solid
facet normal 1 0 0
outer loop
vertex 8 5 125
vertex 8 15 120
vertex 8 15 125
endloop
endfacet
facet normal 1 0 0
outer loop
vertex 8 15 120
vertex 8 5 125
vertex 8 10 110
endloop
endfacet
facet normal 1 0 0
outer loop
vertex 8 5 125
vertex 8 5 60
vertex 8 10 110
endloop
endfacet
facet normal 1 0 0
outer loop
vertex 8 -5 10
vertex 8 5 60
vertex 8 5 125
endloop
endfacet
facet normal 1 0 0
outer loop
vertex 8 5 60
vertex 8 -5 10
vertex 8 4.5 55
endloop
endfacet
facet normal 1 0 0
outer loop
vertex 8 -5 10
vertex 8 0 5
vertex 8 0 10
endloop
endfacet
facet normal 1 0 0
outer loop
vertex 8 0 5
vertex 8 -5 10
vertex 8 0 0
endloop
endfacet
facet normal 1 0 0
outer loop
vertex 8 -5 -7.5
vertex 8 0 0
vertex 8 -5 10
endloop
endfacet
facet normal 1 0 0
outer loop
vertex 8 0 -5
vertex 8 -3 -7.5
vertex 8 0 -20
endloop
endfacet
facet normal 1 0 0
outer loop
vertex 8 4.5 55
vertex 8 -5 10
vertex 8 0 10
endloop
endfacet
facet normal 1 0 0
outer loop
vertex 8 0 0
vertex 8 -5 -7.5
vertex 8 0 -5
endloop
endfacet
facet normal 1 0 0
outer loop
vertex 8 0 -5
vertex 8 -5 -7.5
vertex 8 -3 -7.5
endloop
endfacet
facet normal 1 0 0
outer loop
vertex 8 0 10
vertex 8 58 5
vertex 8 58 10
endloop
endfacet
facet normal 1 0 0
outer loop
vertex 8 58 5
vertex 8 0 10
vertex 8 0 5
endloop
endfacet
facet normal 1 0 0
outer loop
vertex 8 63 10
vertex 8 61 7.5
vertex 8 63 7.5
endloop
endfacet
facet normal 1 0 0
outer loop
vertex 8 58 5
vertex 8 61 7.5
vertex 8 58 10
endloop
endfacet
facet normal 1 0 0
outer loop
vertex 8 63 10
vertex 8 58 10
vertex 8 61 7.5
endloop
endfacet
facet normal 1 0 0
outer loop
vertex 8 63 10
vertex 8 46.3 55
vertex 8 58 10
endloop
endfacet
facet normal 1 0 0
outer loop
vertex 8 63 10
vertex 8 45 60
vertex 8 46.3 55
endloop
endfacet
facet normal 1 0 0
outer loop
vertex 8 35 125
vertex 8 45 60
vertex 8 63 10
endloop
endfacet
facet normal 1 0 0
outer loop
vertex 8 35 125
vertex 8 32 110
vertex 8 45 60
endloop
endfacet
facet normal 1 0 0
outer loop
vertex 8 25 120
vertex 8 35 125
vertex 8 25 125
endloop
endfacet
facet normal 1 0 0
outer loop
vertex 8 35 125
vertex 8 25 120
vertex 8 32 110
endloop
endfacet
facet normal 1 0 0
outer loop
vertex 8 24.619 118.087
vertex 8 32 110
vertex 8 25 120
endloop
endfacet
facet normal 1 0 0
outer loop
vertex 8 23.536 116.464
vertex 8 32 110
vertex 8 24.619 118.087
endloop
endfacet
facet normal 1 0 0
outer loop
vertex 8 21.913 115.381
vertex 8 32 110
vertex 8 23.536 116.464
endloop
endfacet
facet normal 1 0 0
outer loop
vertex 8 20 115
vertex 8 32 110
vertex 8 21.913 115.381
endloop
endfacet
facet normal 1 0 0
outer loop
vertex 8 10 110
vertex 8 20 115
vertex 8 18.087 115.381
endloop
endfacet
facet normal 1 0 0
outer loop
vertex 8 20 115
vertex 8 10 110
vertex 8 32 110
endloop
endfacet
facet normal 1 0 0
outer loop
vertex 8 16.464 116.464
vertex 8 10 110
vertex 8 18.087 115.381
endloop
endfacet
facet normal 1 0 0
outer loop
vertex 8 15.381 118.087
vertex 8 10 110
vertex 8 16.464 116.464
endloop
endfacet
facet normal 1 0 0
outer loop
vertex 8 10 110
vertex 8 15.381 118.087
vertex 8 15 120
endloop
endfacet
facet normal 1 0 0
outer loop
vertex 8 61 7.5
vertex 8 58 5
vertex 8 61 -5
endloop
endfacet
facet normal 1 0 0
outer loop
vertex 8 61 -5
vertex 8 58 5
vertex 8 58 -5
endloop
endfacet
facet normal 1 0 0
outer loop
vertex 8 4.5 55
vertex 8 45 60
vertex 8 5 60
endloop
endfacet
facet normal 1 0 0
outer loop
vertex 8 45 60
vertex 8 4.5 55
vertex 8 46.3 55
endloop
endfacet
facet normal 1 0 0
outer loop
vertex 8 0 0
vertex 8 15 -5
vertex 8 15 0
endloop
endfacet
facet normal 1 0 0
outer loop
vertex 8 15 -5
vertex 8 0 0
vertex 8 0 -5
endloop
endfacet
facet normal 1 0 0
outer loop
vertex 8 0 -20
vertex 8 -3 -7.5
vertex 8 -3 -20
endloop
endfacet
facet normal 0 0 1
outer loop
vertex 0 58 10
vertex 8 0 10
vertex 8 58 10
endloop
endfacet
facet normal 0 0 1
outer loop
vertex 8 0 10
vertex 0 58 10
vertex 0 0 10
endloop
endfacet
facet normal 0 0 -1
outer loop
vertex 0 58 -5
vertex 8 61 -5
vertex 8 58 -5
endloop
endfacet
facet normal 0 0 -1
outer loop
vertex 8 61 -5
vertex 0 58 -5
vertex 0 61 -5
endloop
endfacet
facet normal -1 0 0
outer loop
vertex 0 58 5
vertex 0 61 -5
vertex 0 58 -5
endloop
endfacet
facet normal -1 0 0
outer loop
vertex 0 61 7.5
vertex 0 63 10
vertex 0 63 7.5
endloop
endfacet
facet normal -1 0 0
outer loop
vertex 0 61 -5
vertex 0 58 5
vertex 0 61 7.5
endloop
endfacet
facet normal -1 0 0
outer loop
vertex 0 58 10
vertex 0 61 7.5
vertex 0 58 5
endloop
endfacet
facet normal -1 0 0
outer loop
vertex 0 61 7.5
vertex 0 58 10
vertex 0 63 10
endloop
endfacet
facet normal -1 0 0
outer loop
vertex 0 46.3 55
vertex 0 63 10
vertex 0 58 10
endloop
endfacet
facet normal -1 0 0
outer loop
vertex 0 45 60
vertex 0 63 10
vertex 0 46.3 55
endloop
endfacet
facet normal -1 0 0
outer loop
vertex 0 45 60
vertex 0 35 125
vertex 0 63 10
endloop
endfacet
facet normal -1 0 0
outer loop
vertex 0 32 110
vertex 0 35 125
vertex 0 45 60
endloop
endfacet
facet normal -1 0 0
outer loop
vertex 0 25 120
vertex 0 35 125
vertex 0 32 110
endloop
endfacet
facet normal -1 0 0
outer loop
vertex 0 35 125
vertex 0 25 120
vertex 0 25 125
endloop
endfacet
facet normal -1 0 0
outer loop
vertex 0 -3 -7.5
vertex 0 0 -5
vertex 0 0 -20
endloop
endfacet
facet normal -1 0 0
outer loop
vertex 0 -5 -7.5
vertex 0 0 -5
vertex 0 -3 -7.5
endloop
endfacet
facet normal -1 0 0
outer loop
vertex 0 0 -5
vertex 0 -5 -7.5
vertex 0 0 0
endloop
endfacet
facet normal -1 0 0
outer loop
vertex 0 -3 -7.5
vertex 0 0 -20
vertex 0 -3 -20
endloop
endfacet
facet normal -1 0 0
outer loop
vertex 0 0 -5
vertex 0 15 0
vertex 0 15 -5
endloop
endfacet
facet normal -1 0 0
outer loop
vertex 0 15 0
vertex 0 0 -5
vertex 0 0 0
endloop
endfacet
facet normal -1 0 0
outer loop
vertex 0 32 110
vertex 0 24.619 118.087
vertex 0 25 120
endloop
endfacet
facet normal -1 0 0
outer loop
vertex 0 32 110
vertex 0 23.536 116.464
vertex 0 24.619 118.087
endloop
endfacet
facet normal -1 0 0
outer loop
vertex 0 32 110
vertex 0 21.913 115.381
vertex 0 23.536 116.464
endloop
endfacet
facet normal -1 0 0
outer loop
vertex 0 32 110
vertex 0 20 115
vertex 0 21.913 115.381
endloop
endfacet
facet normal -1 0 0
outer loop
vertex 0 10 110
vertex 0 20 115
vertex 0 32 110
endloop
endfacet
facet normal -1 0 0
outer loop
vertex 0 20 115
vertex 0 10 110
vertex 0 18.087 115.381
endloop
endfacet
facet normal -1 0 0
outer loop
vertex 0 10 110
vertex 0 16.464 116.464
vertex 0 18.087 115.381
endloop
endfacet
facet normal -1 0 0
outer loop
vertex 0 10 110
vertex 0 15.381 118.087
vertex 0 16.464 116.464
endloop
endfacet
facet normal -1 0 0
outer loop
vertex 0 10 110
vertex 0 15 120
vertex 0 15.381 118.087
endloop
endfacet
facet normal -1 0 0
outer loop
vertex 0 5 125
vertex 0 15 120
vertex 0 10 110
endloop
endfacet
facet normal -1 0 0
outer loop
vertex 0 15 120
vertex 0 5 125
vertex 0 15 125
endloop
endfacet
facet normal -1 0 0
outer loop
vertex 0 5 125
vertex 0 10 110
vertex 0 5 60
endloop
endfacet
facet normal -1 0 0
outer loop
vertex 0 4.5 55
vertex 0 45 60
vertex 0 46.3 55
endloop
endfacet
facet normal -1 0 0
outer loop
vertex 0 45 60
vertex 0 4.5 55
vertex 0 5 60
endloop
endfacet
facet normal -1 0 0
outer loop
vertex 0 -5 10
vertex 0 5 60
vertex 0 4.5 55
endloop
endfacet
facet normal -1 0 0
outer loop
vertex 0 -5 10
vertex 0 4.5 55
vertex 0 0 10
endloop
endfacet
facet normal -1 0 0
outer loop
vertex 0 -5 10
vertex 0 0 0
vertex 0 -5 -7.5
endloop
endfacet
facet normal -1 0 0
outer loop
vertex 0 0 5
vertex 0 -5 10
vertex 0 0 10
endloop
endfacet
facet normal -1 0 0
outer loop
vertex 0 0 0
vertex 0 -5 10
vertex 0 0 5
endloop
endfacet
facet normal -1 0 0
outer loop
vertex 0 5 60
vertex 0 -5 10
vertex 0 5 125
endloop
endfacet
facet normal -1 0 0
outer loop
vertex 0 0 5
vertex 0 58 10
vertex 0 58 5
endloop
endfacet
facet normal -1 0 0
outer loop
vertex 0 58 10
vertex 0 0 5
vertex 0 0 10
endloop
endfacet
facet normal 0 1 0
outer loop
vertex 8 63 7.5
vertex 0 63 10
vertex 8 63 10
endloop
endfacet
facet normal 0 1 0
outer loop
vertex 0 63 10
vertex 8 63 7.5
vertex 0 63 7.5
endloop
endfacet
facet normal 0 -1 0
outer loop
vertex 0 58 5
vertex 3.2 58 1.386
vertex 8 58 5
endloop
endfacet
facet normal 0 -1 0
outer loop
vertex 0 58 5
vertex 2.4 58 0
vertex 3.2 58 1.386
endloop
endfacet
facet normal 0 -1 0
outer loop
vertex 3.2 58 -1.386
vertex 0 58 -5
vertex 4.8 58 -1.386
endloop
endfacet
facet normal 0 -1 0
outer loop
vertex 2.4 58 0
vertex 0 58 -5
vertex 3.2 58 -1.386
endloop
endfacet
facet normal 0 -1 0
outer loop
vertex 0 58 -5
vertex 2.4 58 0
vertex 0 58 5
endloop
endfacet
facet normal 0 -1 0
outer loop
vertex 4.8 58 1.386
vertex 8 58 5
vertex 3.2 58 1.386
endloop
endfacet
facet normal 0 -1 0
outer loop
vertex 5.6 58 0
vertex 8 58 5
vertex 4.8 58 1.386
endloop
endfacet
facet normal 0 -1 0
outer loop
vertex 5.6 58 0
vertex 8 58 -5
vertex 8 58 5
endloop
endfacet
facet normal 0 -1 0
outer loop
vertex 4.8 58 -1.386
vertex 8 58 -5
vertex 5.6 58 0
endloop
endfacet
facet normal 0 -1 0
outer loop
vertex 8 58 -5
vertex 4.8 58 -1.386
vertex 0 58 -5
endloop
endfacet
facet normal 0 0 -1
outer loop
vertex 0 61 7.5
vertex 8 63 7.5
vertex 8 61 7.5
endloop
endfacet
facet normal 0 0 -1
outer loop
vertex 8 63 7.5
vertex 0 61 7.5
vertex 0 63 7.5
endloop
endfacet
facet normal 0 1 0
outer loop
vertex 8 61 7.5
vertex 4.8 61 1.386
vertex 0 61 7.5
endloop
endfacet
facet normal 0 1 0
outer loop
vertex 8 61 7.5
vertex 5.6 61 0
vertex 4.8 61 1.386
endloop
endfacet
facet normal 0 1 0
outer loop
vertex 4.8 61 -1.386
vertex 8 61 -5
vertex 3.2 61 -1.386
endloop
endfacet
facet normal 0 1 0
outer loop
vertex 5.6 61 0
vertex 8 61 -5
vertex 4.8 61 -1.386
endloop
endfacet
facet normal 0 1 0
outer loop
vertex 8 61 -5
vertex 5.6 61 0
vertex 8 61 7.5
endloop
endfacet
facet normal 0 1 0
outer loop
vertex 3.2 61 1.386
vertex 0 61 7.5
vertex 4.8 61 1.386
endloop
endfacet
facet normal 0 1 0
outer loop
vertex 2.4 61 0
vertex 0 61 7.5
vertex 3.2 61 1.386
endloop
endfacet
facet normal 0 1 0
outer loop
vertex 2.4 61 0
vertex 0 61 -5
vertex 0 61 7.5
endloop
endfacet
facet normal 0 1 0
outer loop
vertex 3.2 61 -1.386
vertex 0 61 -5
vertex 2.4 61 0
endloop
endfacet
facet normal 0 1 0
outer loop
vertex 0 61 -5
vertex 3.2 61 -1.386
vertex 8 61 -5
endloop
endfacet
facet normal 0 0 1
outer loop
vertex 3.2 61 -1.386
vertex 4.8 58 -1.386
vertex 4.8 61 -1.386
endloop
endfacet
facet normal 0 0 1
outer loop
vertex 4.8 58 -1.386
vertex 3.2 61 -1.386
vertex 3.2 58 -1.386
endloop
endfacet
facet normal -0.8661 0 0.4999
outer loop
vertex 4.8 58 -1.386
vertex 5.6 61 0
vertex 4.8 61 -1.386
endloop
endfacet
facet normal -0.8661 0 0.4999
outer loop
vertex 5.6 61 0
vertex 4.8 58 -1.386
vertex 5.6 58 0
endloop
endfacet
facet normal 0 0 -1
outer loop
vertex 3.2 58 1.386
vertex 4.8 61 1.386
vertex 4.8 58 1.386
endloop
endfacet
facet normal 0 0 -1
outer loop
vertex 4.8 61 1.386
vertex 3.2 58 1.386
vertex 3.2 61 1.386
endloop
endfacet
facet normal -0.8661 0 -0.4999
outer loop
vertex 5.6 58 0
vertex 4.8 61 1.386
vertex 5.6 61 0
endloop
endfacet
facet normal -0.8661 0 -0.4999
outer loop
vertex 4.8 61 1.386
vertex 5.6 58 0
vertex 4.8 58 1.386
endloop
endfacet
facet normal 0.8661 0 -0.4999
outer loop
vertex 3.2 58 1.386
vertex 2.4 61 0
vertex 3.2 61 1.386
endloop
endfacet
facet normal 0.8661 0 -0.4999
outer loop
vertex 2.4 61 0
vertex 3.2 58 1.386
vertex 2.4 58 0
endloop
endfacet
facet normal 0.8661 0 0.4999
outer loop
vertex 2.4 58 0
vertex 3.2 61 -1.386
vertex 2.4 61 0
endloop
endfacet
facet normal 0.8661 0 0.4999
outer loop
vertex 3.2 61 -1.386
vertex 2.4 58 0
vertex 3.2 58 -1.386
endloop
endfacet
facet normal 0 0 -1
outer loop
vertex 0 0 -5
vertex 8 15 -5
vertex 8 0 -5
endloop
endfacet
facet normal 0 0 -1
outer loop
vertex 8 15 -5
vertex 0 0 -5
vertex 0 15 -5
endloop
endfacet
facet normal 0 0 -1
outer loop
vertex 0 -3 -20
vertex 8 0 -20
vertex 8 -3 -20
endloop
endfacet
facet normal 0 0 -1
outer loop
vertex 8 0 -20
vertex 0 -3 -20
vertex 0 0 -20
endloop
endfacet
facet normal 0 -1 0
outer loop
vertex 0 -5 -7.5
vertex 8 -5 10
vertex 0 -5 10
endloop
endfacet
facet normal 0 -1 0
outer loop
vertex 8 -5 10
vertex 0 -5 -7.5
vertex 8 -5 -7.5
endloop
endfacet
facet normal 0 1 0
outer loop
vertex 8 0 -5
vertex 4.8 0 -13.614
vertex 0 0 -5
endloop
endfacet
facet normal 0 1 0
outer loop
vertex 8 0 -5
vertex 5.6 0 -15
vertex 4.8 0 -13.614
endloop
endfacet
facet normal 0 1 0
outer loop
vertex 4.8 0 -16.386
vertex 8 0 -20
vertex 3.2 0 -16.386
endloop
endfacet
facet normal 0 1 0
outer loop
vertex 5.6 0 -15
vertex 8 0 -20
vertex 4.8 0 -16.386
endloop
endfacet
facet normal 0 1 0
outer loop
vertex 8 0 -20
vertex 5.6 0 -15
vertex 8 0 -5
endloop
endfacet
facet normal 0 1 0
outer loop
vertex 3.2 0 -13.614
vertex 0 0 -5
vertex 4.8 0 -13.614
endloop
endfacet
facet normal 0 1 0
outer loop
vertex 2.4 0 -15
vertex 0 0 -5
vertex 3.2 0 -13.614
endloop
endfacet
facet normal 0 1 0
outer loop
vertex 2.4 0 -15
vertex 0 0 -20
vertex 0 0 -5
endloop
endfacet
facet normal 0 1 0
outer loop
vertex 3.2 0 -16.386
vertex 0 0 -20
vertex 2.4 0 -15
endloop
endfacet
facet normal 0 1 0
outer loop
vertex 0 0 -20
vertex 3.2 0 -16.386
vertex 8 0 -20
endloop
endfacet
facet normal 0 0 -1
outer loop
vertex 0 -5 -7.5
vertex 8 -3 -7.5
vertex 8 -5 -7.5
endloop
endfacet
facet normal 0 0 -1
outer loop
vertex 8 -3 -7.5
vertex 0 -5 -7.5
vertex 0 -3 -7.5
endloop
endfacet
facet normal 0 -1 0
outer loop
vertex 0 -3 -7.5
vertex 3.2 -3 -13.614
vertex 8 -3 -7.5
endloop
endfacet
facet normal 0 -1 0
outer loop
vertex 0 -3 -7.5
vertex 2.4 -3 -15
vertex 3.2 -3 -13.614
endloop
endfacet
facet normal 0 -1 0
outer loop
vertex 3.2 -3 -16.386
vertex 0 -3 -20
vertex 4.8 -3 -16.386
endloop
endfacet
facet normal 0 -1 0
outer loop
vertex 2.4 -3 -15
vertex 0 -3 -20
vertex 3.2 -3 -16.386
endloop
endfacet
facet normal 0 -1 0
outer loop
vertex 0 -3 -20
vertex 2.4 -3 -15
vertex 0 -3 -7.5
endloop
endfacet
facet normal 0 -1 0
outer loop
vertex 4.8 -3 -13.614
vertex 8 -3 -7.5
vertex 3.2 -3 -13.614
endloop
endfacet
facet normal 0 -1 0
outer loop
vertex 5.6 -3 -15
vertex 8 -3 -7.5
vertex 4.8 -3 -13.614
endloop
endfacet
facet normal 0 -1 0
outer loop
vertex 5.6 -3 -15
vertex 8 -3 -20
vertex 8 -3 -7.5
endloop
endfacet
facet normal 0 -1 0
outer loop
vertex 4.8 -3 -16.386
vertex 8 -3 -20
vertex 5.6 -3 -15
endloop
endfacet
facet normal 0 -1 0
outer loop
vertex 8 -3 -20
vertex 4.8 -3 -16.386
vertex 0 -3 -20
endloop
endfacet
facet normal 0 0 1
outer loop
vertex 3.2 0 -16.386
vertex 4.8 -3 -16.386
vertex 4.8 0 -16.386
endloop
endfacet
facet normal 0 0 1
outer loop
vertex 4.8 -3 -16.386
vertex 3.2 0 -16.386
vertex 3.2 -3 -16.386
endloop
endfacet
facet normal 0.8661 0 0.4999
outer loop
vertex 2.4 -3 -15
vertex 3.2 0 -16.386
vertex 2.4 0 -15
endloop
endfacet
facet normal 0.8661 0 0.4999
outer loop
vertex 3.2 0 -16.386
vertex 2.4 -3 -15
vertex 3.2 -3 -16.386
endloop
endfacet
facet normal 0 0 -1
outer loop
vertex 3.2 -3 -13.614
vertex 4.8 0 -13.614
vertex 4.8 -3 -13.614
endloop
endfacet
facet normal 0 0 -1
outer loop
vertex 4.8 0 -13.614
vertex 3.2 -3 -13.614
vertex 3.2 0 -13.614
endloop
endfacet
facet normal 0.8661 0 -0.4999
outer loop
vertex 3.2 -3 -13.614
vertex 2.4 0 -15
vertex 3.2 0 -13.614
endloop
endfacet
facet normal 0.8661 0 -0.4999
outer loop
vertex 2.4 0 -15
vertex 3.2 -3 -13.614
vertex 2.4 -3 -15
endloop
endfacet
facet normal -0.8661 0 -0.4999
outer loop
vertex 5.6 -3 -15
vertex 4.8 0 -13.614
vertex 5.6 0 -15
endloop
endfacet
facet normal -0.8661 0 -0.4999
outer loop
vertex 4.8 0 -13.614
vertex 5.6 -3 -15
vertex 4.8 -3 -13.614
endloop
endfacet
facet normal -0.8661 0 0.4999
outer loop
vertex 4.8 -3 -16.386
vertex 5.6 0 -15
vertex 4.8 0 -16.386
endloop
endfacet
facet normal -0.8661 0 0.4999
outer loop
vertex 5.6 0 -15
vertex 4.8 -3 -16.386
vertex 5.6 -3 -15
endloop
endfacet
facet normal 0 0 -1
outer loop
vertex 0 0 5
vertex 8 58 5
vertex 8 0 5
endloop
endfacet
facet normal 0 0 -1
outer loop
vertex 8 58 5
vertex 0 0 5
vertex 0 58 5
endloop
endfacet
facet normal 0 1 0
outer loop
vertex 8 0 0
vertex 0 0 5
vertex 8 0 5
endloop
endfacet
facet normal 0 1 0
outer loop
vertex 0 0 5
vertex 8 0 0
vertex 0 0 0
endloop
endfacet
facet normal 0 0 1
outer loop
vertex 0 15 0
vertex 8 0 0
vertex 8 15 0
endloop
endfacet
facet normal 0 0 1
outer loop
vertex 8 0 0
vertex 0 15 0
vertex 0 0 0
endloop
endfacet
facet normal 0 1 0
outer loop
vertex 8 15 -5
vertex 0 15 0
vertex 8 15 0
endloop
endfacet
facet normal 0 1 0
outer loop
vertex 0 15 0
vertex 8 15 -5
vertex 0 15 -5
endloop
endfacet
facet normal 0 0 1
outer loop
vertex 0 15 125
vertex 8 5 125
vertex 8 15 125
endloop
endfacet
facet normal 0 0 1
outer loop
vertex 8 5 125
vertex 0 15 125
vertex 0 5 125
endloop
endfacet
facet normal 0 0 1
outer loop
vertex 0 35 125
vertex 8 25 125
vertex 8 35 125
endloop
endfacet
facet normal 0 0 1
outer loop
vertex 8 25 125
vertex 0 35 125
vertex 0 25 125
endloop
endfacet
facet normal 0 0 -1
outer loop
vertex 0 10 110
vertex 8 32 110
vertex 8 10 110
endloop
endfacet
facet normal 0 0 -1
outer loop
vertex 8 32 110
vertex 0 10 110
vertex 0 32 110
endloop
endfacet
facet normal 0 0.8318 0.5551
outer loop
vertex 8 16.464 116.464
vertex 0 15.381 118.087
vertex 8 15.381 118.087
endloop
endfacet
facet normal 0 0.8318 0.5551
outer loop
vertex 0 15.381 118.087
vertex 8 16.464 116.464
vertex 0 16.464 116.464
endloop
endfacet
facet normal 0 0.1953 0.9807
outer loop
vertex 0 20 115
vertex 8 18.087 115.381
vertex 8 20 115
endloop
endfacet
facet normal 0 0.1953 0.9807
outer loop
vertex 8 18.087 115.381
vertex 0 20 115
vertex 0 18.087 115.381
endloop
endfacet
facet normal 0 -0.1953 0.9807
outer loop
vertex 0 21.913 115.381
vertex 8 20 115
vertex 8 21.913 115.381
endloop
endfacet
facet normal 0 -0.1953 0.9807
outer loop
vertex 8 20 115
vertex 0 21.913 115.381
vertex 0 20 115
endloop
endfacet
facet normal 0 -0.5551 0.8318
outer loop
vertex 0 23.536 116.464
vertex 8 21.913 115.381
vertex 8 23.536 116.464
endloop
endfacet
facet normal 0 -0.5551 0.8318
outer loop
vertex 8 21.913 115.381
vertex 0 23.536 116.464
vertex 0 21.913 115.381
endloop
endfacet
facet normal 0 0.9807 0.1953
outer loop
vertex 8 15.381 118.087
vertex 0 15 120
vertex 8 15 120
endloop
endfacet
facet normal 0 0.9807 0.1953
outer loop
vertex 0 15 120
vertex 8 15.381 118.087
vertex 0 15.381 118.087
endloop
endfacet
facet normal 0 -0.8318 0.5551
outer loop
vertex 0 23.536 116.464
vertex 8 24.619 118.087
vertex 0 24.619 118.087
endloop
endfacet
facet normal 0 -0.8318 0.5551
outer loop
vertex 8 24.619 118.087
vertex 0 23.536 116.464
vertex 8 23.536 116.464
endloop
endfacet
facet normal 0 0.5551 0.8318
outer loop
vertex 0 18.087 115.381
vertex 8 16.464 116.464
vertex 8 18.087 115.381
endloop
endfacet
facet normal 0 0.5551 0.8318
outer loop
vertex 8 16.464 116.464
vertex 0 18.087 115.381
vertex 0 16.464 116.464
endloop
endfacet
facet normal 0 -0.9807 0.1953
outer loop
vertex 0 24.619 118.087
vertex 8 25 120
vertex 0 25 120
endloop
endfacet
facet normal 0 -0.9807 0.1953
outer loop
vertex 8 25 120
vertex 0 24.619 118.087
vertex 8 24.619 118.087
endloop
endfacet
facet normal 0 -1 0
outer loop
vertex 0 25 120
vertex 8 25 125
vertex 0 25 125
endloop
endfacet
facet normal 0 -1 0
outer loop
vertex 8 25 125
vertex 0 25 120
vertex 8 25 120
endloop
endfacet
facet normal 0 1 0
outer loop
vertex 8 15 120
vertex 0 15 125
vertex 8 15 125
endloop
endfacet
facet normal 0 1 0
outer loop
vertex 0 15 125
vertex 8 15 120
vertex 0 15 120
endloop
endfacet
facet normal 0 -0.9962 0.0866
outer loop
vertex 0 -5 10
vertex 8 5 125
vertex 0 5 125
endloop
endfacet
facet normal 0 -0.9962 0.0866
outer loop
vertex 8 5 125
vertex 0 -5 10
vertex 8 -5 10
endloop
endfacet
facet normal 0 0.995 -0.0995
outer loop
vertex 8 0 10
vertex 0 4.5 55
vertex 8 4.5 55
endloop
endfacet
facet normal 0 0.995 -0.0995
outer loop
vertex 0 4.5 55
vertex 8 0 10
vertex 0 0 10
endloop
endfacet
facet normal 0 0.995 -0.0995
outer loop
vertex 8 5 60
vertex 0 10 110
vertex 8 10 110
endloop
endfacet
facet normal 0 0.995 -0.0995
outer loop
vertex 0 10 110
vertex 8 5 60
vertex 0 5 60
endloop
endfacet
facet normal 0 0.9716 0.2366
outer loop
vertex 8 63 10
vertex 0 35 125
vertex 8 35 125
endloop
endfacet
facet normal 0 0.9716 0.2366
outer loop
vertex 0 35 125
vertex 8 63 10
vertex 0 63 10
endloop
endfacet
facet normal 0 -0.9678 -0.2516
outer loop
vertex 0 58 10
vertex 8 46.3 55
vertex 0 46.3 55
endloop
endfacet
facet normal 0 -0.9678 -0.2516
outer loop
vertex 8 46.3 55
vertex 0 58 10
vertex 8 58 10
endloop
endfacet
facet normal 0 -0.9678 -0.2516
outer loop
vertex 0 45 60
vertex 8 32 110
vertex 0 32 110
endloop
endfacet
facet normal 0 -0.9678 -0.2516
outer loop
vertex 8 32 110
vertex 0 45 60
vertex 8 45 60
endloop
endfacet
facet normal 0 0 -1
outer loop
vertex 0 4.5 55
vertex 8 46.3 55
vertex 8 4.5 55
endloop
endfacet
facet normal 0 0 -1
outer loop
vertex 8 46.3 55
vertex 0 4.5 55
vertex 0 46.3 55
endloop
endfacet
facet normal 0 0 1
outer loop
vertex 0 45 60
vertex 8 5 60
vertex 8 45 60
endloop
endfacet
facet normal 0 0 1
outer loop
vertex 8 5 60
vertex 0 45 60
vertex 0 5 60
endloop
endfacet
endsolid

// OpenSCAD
// file: vars.scad
SIDE_WIDTH = 8;
RESERVE_V = 10;
RESERVE_H = 15;
RESERVE_R = 0.5;
OUTER_R = 100;
INNER_R = 25;
SPOOL_WIDTH = 70;
AXIS_R = 5;
// main file
include <vars.scad>

module side_support()
{
    union()
    {
        // MOUNTING
        union()
        {
            translate([0,0,5])        
                cube(size = [SIDE_WIDTH,38,5]);
            translate([0,38,5])
                cube(size = [SIDE_WIDTH,20,5]);
            translate([0,0,-5])        
                cube(size = [SIDE_WIDTH,15,5]);        
            translate([0,-5,-5])
                cube(size = [SIDE_WIDTH,5,15]);
            
            difference()
            {
                translate([0,38+20,-5])
                    cube(size = [SIDE_WIDTH,5,15]);
            
                translate([-SIDE_WIDTH/2,38+23,-5])
                    cube(size = [SIDE_WIDTH * 2,2,12.5]);                
                translate([SIDE_WIDTH/2,65,0])
                rotate([90,0,0])
                    cylinder(h = 10, r = 1.6);
            }
            
            rotate([0,0,180])
            translate([-SIDE_WIDTH,-38-20,-15])
            difference()
            {
                translate([0,38+20,-5])
                    cube(size = [SIDE_WIDTH,5,15]);
            
                translate([-SIDE_WIDTH/2,38+23,-5])
                    cube(size = [SIDE_WIDTH * 2,2,12.5]);                
                translate([SIDE_WIDTH/2,65,0])
                rotate([90,0,0])
                    cylinder(h = 10, r = 1.6);
            }
        }
        
        // AXIS SUPPORT
        difference()
        {
            translate([0,5, OUTER_R+RESERVE_V])
                cube(size = [SIDE_WIDTH,30,15]);
            translate([-SIDE_WIDTH/2,20,10+OUTER_R+RESERVE_V])
            rotate([0,90,0])
                cylinder(h = SIDE_WIDTH * 2, r = AXIS_R);
            translate([-SIDE_WIDTH/2,15, OUTER_R+RESERVE_V + AXIS_R * 2])
                cube(size = [SIDE_WIDTH * 2,AXIS_R*2,AXIS_R*2]);
        }
        
        // STAND 1
        translate([0,20,0])
        rotate([90,0,90])
	linear_extrude(height = SIDE_WIDTH)
	polygon([[-25,10],[-15,OUTER_R+RESERVE_V+15],[-10,OUTER_R+RESERVE_V], [-20, 10]]);
        
        // STAND 2                
        translate([SIDE_WIDTH,20,0])
        rotate([90,0,270])
	linear_extrude(height = SIDE_WIDTH)
	polygon([[-43,10],[-15,OUTER_R+RESERVE_V+15],[-12,OUTER_R+RESERVE_V], [-38, 10]]);
                
        // STAND CONNECTOR
        translate([SIDE_WIDTH,20,0])
        rotate([90,0,270])
	linear_extrude(height = SIDE_WIDTH)
	polygon([[-30,55],[-30,60],[17,60], [17,55]]);
    }    
}

side_support();
